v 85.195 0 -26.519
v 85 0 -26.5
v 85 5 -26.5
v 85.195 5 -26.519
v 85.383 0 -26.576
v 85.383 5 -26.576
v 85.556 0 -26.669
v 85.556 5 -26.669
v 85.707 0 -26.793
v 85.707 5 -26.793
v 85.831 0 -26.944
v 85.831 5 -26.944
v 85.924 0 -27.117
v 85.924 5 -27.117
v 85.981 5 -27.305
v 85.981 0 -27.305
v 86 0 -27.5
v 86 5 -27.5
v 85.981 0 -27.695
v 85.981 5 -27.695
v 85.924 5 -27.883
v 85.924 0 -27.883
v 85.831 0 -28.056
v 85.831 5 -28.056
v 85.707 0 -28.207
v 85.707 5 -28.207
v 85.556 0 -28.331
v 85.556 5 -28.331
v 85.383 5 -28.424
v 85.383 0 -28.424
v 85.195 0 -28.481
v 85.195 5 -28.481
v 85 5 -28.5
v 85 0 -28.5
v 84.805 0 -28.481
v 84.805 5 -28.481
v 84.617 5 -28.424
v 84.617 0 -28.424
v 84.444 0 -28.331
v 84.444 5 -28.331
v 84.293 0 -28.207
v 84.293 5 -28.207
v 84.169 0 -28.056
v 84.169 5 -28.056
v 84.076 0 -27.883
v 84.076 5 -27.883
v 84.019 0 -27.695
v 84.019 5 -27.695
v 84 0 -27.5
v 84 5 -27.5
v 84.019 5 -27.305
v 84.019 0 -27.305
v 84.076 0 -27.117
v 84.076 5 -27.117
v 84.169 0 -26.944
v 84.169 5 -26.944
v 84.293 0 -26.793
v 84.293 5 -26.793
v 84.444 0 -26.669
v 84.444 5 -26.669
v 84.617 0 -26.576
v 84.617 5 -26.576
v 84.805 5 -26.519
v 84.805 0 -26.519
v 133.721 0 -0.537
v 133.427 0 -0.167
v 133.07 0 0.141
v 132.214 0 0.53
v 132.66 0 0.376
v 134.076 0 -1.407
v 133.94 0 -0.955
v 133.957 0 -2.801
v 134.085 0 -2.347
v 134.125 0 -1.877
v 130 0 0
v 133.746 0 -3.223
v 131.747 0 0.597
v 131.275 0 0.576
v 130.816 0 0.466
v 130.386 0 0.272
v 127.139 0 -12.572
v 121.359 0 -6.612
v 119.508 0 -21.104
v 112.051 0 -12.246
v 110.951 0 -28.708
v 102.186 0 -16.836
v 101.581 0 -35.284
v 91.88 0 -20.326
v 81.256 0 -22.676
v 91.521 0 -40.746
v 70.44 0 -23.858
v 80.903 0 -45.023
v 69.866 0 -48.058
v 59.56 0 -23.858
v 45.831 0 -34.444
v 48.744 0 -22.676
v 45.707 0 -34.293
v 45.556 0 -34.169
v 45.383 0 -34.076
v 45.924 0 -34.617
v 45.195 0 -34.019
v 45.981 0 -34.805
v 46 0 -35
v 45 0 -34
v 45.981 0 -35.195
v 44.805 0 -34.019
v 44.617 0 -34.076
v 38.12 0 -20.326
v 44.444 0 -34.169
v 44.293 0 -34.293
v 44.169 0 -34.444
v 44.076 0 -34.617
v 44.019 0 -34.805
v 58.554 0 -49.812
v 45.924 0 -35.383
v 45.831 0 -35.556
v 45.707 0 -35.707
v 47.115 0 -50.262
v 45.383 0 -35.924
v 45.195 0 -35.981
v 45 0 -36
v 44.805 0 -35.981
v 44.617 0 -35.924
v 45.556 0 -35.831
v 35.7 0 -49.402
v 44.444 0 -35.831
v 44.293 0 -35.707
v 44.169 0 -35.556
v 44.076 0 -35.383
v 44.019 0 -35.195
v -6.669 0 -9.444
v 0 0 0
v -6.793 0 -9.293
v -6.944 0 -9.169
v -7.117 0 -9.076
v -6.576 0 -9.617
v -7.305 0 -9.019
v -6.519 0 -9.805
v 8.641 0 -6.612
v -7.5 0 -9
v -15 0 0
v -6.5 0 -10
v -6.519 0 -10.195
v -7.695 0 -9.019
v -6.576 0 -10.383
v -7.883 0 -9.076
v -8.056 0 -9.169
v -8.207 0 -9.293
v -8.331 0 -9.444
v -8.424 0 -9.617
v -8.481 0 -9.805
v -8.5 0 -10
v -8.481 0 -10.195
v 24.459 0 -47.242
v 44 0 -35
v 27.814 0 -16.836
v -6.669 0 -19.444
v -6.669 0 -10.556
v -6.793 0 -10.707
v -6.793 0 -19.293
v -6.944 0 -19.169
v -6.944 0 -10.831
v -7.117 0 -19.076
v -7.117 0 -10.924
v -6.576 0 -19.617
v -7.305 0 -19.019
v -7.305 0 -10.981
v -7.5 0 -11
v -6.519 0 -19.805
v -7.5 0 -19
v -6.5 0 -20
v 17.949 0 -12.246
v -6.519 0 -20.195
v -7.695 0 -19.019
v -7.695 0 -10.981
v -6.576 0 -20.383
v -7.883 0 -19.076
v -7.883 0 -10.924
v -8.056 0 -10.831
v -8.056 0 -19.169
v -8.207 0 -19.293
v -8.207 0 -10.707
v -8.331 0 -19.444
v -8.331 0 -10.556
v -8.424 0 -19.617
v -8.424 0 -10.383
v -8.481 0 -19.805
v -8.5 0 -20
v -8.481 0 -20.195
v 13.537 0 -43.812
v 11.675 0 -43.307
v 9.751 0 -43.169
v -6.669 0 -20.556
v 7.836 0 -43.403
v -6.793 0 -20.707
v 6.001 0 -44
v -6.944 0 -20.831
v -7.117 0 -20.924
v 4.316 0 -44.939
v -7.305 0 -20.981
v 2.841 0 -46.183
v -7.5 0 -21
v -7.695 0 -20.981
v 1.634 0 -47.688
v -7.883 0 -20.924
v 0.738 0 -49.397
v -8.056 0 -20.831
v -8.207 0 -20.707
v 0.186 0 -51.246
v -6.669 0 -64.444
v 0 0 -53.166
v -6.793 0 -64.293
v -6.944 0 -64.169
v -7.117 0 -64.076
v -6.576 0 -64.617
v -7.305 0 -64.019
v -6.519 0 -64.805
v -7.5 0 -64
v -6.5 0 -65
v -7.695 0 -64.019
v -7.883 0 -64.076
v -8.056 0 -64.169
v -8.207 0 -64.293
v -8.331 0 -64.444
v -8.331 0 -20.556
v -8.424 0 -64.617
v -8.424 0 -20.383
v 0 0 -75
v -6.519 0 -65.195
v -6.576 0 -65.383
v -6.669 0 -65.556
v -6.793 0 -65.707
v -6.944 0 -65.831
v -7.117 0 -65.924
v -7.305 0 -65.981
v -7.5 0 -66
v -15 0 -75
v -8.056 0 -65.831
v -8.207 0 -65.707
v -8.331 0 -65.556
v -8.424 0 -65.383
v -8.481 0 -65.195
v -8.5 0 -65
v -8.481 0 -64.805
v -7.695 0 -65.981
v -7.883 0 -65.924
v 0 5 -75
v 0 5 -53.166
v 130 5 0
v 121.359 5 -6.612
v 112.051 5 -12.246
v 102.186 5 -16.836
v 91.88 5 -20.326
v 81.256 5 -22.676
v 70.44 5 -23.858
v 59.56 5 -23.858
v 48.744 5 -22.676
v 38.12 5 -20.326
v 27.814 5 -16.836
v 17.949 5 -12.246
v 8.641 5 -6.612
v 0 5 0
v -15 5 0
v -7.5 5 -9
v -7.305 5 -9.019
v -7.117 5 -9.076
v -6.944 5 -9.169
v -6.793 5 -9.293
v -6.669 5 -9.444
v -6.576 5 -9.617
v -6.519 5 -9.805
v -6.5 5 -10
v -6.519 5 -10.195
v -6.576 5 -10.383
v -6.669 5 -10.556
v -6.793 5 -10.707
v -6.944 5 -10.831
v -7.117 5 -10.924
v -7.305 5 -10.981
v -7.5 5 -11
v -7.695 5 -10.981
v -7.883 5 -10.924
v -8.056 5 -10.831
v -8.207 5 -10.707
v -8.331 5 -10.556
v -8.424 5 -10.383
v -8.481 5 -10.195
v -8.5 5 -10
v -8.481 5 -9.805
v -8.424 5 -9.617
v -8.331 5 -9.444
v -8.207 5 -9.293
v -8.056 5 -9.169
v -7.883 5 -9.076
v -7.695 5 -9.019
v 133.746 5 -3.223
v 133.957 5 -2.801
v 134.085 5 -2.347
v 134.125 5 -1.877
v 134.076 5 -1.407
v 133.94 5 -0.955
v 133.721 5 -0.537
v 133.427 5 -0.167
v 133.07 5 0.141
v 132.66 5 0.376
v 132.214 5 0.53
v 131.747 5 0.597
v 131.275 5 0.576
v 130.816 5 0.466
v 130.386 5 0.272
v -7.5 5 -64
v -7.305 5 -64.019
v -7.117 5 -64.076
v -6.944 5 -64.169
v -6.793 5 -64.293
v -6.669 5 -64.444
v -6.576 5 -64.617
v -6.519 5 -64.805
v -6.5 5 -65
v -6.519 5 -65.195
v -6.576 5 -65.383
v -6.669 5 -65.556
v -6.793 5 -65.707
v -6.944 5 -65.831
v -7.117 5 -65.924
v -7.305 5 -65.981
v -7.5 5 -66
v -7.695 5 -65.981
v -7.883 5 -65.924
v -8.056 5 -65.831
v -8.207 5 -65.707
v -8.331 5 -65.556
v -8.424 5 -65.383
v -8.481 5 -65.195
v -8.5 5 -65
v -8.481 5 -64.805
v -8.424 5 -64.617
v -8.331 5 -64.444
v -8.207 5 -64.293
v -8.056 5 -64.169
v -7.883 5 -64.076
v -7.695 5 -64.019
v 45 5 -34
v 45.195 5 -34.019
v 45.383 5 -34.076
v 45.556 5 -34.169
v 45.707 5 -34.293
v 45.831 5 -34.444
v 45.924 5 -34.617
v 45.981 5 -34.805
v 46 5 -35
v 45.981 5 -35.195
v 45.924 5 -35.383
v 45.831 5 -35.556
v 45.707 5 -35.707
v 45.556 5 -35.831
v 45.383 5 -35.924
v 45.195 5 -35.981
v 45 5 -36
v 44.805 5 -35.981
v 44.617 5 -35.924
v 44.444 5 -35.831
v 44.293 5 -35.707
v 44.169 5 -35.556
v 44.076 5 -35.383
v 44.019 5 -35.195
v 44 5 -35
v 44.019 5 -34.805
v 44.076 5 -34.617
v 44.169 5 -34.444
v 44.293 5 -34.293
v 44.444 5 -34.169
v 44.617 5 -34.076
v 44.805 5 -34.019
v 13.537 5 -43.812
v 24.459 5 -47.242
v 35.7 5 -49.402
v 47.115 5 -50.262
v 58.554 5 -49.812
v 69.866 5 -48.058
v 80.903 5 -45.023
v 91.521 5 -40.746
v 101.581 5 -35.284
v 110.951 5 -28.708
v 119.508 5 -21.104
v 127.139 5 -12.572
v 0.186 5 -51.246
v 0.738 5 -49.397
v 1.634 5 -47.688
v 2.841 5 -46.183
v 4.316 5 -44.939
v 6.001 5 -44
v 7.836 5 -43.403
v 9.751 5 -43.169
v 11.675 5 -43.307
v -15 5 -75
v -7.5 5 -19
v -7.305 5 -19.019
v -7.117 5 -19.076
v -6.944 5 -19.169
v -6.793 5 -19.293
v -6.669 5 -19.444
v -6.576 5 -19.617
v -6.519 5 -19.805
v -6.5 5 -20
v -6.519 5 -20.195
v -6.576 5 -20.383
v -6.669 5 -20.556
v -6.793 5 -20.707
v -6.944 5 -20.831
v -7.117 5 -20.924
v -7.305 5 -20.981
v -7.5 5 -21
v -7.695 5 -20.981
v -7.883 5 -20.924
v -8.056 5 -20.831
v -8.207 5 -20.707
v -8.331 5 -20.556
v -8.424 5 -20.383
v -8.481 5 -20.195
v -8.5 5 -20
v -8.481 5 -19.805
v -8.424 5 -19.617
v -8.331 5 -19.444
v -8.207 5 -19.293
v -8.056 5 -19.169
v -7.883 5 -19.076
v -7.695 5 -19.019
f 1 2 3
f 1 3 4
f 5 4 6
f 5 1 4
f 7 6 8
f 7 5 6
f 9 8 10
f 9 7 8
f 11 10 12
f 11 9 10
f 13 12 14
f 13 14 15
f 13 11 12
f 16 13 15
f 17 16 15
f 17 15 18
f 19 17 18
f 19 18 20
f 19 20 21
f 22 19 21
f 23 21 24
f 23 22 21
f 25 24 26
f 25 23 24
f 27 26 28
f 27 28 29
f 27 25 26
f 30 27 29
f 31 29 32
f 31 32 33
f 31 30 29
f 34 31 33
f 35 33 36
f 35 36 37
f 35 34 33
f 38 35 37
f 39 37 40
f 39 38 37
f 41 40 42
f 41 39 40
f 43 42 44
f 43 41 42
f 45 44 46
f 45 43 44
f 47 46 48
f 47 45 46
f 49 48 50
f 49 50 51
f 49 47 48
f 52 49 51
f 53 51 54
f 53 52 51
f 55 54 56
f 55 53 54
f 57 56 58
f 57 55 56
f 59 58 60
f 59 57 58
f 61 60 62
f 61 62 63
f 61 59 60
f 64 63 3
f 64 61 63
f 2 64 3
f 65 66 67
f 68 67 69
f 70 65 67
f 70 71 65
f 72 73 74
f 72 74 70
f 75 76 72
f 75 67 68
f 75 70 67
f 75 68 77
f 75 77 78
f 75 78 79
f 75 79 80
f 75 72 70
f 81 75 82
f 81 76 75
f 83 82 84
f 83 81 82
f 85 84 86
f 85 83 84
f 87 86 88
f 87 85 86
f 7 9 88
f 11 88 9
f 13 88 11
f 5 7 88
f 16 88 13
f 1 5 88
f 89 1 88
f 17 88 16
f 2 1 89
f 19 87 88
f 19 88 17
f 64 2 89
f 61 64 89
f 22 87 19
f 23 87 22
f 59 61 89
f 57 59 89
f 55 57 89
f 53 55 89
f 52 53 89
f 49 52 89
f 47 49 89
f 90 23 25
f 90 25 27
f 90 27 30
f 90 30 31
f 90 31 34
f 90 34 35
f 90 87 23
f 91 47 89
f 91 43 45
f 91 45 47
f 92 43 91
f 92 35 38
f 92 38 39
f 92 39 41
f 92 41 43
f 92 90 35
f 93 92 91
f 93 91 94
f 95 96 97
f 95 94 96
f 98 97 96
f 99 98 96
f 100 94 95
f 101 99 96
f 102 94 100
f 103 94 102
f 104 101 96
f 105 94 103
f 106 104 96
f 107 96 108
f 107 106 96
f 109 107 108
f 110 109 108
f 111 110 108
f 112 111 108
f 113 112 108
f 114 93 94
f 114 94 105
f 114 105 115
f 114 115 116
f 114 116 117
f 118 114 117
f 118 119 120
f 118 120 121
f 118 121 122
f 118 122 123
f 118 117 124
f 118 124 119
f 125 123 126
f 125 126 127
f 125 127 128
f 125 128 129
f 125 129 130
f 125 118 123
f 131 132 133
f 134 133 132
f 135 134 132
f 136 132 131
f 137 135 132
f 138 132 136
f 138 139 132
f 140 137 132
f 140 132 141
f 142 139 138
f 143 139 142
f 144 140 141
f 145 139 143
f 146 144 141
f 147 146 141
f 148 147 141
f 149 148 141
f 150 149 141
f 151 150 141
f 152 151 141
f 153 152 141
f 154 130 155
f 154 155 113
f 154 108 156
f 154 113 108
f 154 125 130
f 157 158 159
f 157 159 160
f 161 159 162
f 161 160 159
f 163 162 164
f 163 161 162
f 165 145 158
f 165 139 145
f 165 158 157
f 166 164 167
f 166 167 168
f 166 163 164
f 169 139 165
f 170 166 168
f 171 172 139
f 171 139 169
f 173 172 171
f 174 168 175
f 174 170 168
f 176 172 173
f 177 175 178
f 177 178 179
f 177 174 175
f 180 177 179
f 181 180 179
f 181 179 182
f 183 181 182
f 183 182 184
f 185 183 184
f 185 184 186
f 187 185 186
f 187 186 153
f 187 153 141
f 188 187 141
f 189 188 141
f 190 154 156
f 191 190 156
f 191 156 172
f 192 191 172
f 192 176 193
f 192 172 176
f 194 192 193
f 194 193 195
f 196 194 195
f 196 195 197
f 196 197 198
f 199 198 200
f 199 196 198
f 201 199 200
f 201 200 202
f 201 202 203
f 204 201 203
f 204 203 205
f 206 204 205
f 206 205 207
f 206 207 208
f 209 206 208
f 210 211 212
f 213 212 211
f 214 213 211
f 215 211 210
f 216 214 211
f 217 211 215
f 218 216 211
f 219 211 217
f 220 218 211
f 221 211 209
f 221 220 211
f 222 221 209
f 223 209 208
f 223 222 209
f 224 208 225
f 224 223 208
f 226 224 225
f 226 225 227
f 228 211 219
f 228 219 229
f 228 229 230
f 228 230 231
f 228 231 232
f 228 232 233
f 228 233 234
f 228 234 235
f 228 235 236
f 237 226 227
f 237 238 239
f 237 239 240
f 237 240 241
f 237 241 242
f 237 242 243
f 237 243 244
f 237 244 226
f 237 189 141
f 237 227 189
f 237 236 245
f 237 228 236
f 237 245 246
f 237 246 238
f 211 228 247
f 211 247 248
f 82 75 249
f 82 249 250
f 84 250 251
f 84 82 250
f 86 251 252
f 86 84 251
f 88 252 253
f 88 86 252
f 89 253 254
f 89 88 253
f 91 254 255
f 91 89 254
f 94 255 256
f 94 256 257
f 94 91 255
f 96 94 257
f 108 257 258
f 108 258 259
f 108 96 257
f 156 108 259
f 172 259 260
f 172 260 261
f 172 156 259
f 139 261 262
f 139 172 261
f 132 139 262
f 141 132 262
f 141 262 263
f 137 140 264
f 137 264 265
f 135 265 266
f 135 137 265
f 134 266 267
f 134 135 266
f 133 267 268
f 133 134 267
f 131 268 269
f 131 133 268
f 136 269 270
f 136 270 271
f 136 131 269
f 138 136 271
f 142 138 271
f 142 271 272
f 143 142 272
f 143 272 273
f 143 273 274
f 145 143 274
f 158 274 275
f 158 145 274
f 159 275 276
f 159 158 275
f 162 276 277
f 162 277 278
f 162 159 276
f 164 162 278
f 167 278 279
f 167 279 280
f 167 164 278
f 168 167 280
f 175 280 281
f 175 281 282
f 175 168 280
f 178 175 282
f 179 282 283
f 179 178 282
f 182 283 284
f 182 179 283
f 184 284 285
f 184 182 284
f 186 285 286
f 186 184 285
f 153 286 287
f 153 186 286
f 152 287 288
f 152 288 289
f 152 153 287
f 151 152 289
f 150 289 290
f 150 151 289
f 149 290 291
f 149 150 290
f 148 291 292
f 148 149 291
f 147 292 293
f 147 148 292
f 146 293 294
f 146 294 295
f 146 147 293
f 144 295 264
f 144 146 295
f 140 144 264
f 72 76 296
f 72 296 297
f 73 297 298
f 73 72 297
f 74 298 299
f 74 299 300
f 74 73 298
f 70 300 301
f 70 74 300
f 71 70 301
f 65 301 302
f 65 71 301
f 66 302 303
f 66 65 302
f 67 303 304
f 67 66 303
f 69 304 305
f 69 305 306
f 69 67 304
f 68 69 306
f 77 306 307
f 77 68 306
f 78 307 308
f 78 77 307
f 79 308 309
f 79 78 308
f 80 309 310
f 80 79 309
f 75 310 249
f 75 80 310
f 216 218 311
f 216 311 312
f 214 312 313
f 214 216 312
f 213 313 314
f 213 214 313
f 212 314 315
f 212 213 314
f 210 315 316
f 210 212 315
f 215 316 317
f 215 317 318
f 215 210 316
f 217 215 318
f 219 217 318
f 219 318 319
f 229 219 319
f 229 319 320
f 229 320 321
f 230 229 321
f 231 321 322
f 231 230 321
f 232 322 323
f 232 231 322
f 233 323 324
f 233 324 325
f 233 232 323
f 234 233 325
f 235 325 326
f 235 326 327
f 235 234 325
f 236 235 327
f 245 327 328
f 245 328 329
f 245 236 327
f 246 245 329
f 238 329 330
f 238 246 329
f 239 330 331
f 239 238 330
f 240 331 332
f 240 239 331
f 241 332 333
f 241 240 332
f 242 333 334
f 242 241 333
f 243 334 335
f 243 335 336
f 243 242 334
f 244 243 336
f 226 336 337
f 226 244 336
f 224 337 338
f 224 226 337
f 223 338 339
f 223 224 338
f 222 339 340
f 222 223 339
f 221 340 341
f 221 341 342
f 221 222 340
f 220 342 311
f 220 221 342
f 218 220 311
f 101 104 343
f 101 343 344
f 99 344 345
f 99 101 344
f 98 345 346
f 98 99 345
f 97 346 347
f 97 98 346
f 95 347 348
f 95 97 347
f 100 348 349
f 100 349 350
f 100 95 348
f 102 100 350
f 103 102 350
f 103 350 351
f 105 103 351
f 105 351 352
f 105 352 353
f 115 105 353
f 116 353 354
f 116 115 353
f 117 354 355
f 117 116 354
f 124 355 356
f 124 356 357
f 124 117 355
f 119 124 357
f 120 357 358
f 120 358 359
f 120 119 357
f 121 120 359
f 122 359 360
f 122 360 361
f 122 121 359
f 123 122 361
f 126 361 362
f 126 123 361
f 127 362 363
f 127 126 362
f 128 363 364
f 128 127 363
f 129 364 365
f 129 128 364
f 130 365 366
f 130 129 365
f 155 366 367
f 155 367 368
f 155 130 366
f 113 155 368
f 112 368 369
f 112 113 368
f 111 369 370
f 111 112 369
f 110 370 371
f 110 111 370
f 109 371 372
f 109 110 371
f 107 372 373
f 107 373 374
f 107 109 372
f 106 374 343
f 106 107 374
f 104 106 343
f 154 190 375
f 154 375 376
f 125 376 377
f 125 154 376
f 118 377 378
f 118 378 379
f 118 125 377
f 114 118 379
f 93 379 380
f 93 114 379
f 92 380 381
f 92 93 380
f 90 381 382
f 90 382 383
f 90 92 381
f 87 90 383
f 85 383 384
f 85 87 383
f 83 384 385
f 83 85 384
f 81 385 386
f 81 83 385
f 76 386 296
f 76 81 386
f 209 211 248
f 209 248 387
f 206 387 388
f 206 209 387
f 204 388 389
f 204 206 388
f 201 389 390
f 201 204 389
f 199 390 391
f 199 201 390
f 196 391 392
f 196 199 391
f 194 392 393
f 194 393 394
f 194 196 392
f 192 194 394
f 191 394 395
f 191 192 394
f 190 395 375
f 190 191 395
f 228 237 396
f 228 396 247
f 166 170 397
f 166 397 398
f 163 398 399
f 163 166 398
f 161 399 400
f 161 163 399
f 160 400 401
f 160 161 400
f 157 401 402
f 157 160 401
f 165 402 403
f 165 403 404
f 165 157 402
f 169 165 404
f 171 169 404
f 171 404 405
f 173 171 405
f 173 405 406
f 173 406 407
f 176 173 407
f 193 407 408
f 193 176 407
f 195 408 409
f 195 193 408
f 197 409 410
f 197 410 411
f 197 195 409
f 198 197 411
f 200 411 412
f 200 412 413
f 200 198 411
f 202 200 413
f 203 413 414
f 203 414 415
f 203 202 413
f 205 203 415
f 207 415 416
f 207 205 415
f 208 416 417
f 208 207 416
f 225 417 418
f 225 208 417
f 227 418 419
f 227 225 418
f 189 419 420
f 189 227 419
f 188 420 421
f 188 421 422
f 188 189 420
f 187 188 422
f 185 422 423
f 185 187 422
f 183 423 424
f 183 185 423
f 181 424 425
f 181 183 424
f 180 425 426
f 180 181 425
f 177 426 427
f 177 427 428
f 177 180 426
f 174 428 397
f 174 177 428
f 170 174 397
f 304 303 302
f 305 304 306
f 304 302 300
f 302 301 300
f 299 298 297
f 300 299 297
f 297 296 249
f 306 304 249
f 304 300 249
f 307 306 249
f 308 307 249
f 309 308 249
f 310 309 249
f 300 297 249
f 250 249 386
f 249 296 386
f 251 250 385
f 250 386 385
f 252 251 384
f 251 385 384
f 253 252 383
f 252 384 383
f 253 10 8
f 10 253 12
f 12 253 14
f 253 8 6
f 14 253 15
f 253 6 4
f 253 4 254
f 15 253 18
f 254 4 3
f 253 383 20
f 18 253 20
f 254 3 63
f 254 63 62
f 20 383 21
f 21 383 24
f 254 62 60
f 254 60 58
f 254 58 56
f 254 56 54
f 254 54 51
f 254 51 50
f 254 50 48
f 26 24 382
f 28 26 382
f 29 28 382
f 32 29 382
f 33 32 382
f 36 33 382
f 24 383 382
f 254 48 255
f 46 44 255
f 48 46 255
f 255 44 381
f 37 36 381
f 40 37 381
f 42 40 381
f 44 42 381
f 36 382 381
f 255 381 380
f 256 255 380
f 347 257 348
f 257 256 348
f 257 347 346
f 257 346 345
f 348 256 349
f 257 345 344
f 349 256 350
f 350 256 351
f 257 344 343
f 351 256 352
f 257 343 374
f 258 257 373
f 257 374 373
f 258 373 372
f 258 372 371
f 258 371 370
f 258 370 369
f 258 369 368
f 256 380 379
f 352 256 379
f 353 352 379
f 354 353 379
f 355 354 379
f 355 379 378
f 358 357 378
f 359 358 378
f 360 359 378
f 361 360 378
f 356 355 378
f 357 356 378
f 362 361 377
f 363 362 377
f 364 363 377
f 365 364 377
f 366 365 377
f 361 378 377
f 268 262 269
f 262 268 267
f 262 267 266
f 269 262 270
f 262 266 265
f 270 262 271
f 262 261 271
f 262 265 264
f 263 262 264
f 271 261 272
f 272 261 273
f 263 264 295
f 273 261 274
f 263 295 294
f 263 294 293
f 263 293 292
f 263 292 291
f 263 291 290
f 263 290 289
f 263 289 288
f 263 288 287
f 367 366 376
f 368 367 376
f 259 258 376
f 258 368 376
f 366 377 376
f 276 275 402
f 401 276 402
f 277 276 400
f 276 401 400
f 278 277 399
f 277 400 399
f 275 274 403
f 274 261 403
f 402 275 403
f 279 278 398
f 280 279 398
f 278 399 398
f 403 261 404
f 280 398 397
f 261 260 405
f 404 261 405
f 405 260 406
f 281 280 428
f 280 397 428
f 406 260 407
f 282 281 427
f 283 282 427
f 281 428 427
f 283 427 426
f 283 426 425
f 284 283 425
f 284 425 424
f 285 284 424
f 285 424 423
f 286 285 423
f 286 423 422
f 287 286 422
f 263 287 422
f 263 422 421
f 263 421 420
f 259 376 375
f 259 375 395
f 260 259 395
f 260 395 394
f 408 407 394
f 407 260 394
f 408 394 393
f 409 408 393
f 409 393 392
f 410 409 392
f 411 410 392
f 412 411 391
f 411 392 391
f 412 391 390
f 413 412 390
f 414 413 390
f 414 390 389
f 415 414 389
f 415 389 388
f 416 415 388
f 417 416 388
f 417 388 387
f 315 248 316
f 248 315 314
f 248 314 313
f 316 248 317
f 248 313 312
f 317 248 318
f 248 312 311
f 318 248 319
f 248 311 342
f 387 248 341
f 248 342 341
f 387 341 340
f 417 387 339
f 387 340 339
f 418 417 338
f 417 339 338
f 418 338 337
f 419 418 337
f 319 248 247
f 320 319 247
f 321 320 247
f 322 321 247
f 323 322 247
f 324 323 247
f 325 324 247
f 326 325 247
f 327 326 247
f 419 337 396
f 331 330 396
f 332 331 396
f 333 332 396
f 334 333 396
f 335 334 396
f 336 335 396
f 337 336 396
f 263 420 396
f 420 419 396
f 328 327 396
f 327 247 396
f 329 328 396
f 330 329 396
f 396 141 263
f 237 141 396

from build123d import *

# Parameters (mm, degrees)
SKETCH1_R           = 1
BOSS_EXTRUDE1_DEPTH = 5


with BuildPart() as part:
    # Sketch1 → Boss-Extrude1 (new body)
    with BuildSketch(Plane(origin=(0, 0, 0), x_dir=(1, 0, 0), z_dir=(0, 1, 0))):
        with BuildLine():
            Line((0, 75), (0, 53.165914195))
            ThreePointArc((0, 53.165914195), (4.315565807, 44.938690611), (13.537441581, 43.812491984))
            ThreePointArc((13.537441581, 43.812491984), (80.9029452, 45.023033848), (133.74584981, 3.223465408))
            ThreePointArc((133.74584981, 3.223465408), (133.255689752, 0.004881448), (130, 0))
            ThreePointArc((130, 0), (65, 24.006579232), (0, 0))
            Line((0, 0), (-15, 0))
            Line((-15, 0), (-15, 75))
            Line((-15, 75), (0, 75))
        make_face()
        with Locations(Location((-7.5, 10, 0), (0, 0, 270))):
            Circle(SKETCH1_R, mode=Mode.SUBTRACT)
        with Locations(Location((-7.5, 20, 0), (0, 0, 270))):
            Circle(SKETCH1_R, mode=Mode.SUBTRACT)
        with Locations(Location((-7.5, 65, 0), (0, 0, 270))):
            Circle(SKETCH1_R, mode=Mode.SUBTRACT)
        with Locations(Location((85, 27.5, 0), (0, 0, 270))):
            Circle(SKETCH1_R, mode=Mode.SUBTRACT)
        with Locations(Location((45, 35, 0), (0, 0, 270))):
            Circle(SKETCH1_R, mode=Mode.SUBTRACT)
    extrude(amount=BOSS_EXTRUDE1_DEPTH)


solid = part.part
